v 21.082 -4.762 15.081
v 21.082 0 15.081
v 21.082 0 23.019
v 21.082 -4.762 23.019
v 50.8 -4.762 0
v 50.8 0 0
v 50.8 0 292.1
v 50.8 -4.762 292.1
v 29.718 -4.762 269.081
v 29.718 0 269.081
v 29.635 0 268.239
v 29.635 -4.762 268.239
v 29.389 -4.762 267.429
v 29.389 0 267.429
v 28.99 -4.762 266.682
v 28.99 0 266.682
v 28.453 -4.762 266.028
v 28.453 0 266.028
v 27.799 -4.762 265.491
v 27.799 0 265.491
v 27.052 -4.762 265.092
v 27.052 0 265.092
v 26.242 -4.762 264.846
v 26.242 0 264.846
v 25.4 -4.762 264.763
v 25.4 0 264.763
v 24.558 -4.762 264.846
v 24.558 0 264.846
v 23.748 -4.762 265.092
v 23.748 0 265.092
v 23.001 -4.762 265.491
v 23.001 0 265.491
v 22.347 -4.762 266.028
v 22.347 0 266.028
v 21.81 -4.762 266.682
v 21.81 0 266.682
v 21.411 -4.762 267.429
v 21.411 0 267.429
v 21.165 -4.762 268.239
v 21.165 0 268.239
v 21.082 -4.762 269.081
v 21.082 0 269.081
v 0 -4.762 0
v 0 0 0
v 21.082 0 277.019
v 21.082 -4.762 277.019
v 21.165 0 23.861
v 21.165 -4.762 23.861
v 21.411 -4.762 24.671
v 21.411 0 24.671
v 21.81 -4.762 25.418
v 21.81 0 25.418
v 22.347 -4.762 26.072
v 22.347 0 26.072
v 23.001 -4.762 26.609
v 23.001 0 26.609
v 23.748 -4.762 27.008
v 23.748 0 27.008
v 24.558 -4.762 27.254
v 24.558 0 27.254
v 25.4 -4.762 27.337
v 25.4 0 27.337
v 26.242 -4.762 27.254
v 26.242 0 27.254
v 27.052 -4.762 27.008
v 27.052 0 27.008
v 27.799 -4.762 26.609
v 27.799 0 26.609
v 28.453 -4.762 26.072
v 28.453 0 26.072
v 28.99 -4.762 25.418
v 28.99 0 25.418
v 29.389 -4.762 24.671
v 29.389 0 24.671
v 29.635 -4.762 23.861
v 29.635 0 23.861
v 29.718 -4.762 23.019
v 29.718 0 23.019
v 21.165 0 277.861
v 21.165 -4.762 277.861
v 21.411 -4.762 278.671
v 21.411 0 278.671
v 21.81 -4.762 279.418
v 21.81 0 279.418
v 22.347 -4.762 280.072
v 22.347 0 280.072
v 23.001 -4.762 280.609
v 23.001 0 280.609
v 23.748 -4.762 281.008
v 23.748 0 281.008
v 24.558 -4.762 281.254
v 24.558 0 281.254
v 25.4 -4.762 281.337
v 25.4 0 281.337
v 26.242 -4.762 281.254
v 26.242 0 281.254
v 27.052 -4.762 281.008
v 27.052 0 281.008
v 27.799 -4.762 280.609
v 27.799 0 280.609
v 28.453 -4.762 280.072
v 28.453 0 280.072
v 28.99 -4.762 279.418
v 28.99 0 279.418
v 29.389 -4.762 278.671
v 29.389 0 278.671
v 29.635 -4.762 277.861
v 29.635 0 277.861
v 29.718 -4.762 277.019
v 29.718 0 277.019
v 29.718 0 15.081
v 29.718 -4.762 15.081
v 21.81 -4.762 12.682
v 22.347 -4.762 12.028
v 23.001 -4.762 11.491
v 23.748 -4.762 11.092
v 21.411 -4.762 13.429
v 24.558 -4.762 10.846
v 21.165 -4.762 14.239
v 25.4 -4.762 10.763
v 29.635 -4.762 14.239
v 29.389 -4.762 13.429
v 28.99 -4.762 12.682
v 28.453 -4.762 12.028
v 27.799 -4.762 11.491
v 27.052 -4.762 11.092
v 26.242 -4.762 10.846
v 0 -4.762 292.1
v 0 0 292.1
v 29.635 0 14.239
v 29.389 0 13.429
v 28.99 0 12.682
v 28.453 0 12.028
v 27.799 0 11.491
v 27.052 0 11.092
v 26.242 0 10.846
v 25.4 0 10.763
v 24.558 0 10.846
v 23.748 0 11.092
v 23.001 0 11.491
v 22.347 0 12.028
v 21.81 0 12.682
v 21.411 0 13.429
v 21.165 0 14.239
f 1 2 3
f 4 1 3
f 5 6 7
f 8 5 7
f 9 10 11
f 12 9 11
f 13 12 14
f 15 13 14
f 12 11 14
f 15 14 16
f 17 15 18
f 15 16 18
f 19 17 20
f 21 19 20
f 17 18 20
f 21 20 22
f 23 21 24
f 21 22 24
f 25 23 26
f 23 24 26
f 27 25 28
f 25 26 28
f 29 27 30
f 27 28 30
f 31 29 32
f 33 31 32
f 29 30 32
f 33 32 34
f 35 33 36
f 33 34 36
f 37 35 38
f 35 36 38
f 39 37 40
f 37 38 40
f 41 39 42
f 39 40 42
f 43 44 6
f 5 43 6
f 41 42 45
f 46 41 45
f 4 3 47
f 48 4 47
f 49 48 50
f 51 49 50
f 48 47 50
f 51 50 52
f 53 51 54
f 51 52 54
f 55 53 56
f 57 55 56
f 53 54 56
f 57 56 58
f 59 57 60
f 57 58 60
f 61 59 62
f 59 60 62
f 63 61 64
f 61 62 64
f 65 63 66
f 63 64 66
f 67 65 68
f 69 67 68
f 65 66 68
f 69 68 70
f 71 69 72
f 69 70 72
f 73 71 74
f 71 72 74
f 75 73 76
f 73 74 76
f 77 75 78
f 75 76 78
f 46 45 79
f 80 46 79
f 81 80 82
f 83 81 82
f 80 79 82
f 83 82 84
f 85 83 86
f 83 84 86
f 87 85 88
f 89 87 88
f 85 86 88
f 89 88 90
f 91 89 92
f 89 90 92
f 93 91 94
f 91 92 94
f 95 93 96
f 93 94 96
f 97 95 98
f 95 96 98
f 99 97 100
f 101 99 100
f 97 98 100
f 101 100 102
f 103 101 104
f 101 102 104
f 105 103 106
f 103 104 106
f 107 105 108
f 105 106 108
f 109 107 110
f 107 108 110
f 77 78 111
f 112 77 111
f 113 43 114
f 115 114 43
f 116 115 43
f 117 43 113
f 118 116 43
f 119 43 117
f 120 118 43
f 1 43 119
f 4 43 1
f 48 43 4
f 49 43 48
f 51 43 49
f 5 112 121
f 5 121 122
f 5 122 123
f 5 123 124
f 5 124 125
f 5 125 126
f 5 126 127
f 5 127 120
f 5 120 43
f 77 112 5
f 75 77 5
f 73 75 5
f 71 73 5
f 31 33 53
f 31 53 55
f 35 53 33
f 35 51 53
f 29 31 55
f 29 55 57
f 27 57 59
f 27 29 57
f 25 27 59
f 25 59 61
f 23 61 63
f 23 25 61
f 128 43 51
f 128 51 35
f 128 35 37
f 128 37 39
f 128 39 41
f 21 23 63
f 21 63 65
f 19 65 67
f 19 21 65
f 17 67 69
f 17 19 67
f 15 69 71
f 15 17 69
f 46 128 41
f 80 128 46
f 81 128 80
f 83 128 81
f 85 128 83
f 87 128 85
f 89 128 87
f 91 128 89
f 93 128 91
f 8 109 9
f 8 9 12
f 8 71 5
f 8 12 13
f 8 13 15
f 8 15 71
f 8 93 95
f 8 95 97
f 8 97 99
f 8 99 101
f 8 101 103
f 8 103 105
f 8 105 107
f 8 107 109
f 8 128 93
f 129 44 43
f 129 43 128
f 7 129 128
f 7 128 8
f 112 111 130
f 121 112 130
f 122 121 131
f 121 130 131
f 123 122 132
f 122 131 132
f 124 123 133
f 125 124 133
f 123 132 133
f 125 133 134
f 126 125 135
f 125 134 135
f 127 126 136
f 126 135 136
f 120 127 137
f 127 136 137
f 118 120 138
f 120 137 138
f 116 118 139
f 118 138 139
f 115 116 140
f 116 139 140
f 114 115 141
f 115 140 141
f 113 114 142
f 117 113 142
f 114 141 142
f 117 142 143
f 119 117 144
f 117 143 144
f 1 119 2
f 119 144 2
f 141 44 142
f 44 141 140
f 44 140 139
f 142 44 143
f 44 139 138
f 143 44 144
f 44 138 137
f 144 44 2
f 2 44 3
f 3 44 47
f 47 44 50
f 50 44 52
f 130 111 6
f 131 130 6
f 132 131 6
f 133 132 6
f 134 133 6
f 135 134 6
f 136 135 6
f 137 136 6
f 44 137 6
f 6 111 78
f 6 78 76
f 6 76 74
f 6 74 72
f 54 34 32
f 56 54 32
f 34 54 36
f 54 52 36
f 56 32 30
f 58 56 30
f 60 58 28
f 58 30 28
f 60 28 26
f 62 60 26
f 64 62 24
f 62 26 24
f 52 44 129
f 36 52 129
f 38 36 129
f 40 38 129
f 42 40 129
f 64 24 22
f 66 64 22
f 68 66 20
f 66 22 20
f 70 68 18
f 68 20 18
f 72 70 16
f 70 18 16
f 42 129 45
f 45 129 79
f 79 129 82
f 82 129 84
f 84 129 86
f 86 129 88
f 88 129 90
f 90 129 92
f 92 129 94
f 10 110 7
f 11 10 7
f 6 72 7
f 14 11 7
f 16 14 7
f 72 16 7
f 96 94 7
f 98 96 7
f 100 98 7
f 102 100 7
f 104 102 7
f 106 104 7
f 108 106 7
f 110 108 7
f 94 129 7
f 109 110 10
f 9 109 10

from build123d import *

# Parameters (mm, degrees)
F0_W     = 50.8
F0_H     = 292.1
F1_DEPTH = 4.7625


with BuildPart() as f1:
    # F0 (on Front) → F1 (new body)
    with BuildSketch(Plane.XZ):
        with Locations((25.4, 146.05)):
            Rectangle(F0_W, F0_H)
        with BuildLine():
            ThreePointArc((29.718, 15.08125), (25.4, 10.76325), (21.082, 15.08125))
            Line((21.082, 15.08125), (21.082, 23.01875))
            ThreePointArc((21.082, 23.01875), (25.4, 27.33675), (29.718, 23.01875))
            Line((29.718, 23.01875), (29.718, 15.08125))
        make_face(mode=Mode.SUBTRACT)
        with BuildLine():
            ThreePointArc((29.718, 269.08125), (25.4, 264.76325), (21.082, 269.08125))
            Line((21.082, 269.08125), (21.082, 277.01875))
            ThreePointArc((21.082, 277.01875), (25.4, 281.33675), (29.718, 277.01875))
            Line((29.718, 277.01875), (29.718, 269.08125))
        make_face(mode=Mode.SUBTRACT)
    extrude(amount=F1_DEPTH)


solid = f1.part
